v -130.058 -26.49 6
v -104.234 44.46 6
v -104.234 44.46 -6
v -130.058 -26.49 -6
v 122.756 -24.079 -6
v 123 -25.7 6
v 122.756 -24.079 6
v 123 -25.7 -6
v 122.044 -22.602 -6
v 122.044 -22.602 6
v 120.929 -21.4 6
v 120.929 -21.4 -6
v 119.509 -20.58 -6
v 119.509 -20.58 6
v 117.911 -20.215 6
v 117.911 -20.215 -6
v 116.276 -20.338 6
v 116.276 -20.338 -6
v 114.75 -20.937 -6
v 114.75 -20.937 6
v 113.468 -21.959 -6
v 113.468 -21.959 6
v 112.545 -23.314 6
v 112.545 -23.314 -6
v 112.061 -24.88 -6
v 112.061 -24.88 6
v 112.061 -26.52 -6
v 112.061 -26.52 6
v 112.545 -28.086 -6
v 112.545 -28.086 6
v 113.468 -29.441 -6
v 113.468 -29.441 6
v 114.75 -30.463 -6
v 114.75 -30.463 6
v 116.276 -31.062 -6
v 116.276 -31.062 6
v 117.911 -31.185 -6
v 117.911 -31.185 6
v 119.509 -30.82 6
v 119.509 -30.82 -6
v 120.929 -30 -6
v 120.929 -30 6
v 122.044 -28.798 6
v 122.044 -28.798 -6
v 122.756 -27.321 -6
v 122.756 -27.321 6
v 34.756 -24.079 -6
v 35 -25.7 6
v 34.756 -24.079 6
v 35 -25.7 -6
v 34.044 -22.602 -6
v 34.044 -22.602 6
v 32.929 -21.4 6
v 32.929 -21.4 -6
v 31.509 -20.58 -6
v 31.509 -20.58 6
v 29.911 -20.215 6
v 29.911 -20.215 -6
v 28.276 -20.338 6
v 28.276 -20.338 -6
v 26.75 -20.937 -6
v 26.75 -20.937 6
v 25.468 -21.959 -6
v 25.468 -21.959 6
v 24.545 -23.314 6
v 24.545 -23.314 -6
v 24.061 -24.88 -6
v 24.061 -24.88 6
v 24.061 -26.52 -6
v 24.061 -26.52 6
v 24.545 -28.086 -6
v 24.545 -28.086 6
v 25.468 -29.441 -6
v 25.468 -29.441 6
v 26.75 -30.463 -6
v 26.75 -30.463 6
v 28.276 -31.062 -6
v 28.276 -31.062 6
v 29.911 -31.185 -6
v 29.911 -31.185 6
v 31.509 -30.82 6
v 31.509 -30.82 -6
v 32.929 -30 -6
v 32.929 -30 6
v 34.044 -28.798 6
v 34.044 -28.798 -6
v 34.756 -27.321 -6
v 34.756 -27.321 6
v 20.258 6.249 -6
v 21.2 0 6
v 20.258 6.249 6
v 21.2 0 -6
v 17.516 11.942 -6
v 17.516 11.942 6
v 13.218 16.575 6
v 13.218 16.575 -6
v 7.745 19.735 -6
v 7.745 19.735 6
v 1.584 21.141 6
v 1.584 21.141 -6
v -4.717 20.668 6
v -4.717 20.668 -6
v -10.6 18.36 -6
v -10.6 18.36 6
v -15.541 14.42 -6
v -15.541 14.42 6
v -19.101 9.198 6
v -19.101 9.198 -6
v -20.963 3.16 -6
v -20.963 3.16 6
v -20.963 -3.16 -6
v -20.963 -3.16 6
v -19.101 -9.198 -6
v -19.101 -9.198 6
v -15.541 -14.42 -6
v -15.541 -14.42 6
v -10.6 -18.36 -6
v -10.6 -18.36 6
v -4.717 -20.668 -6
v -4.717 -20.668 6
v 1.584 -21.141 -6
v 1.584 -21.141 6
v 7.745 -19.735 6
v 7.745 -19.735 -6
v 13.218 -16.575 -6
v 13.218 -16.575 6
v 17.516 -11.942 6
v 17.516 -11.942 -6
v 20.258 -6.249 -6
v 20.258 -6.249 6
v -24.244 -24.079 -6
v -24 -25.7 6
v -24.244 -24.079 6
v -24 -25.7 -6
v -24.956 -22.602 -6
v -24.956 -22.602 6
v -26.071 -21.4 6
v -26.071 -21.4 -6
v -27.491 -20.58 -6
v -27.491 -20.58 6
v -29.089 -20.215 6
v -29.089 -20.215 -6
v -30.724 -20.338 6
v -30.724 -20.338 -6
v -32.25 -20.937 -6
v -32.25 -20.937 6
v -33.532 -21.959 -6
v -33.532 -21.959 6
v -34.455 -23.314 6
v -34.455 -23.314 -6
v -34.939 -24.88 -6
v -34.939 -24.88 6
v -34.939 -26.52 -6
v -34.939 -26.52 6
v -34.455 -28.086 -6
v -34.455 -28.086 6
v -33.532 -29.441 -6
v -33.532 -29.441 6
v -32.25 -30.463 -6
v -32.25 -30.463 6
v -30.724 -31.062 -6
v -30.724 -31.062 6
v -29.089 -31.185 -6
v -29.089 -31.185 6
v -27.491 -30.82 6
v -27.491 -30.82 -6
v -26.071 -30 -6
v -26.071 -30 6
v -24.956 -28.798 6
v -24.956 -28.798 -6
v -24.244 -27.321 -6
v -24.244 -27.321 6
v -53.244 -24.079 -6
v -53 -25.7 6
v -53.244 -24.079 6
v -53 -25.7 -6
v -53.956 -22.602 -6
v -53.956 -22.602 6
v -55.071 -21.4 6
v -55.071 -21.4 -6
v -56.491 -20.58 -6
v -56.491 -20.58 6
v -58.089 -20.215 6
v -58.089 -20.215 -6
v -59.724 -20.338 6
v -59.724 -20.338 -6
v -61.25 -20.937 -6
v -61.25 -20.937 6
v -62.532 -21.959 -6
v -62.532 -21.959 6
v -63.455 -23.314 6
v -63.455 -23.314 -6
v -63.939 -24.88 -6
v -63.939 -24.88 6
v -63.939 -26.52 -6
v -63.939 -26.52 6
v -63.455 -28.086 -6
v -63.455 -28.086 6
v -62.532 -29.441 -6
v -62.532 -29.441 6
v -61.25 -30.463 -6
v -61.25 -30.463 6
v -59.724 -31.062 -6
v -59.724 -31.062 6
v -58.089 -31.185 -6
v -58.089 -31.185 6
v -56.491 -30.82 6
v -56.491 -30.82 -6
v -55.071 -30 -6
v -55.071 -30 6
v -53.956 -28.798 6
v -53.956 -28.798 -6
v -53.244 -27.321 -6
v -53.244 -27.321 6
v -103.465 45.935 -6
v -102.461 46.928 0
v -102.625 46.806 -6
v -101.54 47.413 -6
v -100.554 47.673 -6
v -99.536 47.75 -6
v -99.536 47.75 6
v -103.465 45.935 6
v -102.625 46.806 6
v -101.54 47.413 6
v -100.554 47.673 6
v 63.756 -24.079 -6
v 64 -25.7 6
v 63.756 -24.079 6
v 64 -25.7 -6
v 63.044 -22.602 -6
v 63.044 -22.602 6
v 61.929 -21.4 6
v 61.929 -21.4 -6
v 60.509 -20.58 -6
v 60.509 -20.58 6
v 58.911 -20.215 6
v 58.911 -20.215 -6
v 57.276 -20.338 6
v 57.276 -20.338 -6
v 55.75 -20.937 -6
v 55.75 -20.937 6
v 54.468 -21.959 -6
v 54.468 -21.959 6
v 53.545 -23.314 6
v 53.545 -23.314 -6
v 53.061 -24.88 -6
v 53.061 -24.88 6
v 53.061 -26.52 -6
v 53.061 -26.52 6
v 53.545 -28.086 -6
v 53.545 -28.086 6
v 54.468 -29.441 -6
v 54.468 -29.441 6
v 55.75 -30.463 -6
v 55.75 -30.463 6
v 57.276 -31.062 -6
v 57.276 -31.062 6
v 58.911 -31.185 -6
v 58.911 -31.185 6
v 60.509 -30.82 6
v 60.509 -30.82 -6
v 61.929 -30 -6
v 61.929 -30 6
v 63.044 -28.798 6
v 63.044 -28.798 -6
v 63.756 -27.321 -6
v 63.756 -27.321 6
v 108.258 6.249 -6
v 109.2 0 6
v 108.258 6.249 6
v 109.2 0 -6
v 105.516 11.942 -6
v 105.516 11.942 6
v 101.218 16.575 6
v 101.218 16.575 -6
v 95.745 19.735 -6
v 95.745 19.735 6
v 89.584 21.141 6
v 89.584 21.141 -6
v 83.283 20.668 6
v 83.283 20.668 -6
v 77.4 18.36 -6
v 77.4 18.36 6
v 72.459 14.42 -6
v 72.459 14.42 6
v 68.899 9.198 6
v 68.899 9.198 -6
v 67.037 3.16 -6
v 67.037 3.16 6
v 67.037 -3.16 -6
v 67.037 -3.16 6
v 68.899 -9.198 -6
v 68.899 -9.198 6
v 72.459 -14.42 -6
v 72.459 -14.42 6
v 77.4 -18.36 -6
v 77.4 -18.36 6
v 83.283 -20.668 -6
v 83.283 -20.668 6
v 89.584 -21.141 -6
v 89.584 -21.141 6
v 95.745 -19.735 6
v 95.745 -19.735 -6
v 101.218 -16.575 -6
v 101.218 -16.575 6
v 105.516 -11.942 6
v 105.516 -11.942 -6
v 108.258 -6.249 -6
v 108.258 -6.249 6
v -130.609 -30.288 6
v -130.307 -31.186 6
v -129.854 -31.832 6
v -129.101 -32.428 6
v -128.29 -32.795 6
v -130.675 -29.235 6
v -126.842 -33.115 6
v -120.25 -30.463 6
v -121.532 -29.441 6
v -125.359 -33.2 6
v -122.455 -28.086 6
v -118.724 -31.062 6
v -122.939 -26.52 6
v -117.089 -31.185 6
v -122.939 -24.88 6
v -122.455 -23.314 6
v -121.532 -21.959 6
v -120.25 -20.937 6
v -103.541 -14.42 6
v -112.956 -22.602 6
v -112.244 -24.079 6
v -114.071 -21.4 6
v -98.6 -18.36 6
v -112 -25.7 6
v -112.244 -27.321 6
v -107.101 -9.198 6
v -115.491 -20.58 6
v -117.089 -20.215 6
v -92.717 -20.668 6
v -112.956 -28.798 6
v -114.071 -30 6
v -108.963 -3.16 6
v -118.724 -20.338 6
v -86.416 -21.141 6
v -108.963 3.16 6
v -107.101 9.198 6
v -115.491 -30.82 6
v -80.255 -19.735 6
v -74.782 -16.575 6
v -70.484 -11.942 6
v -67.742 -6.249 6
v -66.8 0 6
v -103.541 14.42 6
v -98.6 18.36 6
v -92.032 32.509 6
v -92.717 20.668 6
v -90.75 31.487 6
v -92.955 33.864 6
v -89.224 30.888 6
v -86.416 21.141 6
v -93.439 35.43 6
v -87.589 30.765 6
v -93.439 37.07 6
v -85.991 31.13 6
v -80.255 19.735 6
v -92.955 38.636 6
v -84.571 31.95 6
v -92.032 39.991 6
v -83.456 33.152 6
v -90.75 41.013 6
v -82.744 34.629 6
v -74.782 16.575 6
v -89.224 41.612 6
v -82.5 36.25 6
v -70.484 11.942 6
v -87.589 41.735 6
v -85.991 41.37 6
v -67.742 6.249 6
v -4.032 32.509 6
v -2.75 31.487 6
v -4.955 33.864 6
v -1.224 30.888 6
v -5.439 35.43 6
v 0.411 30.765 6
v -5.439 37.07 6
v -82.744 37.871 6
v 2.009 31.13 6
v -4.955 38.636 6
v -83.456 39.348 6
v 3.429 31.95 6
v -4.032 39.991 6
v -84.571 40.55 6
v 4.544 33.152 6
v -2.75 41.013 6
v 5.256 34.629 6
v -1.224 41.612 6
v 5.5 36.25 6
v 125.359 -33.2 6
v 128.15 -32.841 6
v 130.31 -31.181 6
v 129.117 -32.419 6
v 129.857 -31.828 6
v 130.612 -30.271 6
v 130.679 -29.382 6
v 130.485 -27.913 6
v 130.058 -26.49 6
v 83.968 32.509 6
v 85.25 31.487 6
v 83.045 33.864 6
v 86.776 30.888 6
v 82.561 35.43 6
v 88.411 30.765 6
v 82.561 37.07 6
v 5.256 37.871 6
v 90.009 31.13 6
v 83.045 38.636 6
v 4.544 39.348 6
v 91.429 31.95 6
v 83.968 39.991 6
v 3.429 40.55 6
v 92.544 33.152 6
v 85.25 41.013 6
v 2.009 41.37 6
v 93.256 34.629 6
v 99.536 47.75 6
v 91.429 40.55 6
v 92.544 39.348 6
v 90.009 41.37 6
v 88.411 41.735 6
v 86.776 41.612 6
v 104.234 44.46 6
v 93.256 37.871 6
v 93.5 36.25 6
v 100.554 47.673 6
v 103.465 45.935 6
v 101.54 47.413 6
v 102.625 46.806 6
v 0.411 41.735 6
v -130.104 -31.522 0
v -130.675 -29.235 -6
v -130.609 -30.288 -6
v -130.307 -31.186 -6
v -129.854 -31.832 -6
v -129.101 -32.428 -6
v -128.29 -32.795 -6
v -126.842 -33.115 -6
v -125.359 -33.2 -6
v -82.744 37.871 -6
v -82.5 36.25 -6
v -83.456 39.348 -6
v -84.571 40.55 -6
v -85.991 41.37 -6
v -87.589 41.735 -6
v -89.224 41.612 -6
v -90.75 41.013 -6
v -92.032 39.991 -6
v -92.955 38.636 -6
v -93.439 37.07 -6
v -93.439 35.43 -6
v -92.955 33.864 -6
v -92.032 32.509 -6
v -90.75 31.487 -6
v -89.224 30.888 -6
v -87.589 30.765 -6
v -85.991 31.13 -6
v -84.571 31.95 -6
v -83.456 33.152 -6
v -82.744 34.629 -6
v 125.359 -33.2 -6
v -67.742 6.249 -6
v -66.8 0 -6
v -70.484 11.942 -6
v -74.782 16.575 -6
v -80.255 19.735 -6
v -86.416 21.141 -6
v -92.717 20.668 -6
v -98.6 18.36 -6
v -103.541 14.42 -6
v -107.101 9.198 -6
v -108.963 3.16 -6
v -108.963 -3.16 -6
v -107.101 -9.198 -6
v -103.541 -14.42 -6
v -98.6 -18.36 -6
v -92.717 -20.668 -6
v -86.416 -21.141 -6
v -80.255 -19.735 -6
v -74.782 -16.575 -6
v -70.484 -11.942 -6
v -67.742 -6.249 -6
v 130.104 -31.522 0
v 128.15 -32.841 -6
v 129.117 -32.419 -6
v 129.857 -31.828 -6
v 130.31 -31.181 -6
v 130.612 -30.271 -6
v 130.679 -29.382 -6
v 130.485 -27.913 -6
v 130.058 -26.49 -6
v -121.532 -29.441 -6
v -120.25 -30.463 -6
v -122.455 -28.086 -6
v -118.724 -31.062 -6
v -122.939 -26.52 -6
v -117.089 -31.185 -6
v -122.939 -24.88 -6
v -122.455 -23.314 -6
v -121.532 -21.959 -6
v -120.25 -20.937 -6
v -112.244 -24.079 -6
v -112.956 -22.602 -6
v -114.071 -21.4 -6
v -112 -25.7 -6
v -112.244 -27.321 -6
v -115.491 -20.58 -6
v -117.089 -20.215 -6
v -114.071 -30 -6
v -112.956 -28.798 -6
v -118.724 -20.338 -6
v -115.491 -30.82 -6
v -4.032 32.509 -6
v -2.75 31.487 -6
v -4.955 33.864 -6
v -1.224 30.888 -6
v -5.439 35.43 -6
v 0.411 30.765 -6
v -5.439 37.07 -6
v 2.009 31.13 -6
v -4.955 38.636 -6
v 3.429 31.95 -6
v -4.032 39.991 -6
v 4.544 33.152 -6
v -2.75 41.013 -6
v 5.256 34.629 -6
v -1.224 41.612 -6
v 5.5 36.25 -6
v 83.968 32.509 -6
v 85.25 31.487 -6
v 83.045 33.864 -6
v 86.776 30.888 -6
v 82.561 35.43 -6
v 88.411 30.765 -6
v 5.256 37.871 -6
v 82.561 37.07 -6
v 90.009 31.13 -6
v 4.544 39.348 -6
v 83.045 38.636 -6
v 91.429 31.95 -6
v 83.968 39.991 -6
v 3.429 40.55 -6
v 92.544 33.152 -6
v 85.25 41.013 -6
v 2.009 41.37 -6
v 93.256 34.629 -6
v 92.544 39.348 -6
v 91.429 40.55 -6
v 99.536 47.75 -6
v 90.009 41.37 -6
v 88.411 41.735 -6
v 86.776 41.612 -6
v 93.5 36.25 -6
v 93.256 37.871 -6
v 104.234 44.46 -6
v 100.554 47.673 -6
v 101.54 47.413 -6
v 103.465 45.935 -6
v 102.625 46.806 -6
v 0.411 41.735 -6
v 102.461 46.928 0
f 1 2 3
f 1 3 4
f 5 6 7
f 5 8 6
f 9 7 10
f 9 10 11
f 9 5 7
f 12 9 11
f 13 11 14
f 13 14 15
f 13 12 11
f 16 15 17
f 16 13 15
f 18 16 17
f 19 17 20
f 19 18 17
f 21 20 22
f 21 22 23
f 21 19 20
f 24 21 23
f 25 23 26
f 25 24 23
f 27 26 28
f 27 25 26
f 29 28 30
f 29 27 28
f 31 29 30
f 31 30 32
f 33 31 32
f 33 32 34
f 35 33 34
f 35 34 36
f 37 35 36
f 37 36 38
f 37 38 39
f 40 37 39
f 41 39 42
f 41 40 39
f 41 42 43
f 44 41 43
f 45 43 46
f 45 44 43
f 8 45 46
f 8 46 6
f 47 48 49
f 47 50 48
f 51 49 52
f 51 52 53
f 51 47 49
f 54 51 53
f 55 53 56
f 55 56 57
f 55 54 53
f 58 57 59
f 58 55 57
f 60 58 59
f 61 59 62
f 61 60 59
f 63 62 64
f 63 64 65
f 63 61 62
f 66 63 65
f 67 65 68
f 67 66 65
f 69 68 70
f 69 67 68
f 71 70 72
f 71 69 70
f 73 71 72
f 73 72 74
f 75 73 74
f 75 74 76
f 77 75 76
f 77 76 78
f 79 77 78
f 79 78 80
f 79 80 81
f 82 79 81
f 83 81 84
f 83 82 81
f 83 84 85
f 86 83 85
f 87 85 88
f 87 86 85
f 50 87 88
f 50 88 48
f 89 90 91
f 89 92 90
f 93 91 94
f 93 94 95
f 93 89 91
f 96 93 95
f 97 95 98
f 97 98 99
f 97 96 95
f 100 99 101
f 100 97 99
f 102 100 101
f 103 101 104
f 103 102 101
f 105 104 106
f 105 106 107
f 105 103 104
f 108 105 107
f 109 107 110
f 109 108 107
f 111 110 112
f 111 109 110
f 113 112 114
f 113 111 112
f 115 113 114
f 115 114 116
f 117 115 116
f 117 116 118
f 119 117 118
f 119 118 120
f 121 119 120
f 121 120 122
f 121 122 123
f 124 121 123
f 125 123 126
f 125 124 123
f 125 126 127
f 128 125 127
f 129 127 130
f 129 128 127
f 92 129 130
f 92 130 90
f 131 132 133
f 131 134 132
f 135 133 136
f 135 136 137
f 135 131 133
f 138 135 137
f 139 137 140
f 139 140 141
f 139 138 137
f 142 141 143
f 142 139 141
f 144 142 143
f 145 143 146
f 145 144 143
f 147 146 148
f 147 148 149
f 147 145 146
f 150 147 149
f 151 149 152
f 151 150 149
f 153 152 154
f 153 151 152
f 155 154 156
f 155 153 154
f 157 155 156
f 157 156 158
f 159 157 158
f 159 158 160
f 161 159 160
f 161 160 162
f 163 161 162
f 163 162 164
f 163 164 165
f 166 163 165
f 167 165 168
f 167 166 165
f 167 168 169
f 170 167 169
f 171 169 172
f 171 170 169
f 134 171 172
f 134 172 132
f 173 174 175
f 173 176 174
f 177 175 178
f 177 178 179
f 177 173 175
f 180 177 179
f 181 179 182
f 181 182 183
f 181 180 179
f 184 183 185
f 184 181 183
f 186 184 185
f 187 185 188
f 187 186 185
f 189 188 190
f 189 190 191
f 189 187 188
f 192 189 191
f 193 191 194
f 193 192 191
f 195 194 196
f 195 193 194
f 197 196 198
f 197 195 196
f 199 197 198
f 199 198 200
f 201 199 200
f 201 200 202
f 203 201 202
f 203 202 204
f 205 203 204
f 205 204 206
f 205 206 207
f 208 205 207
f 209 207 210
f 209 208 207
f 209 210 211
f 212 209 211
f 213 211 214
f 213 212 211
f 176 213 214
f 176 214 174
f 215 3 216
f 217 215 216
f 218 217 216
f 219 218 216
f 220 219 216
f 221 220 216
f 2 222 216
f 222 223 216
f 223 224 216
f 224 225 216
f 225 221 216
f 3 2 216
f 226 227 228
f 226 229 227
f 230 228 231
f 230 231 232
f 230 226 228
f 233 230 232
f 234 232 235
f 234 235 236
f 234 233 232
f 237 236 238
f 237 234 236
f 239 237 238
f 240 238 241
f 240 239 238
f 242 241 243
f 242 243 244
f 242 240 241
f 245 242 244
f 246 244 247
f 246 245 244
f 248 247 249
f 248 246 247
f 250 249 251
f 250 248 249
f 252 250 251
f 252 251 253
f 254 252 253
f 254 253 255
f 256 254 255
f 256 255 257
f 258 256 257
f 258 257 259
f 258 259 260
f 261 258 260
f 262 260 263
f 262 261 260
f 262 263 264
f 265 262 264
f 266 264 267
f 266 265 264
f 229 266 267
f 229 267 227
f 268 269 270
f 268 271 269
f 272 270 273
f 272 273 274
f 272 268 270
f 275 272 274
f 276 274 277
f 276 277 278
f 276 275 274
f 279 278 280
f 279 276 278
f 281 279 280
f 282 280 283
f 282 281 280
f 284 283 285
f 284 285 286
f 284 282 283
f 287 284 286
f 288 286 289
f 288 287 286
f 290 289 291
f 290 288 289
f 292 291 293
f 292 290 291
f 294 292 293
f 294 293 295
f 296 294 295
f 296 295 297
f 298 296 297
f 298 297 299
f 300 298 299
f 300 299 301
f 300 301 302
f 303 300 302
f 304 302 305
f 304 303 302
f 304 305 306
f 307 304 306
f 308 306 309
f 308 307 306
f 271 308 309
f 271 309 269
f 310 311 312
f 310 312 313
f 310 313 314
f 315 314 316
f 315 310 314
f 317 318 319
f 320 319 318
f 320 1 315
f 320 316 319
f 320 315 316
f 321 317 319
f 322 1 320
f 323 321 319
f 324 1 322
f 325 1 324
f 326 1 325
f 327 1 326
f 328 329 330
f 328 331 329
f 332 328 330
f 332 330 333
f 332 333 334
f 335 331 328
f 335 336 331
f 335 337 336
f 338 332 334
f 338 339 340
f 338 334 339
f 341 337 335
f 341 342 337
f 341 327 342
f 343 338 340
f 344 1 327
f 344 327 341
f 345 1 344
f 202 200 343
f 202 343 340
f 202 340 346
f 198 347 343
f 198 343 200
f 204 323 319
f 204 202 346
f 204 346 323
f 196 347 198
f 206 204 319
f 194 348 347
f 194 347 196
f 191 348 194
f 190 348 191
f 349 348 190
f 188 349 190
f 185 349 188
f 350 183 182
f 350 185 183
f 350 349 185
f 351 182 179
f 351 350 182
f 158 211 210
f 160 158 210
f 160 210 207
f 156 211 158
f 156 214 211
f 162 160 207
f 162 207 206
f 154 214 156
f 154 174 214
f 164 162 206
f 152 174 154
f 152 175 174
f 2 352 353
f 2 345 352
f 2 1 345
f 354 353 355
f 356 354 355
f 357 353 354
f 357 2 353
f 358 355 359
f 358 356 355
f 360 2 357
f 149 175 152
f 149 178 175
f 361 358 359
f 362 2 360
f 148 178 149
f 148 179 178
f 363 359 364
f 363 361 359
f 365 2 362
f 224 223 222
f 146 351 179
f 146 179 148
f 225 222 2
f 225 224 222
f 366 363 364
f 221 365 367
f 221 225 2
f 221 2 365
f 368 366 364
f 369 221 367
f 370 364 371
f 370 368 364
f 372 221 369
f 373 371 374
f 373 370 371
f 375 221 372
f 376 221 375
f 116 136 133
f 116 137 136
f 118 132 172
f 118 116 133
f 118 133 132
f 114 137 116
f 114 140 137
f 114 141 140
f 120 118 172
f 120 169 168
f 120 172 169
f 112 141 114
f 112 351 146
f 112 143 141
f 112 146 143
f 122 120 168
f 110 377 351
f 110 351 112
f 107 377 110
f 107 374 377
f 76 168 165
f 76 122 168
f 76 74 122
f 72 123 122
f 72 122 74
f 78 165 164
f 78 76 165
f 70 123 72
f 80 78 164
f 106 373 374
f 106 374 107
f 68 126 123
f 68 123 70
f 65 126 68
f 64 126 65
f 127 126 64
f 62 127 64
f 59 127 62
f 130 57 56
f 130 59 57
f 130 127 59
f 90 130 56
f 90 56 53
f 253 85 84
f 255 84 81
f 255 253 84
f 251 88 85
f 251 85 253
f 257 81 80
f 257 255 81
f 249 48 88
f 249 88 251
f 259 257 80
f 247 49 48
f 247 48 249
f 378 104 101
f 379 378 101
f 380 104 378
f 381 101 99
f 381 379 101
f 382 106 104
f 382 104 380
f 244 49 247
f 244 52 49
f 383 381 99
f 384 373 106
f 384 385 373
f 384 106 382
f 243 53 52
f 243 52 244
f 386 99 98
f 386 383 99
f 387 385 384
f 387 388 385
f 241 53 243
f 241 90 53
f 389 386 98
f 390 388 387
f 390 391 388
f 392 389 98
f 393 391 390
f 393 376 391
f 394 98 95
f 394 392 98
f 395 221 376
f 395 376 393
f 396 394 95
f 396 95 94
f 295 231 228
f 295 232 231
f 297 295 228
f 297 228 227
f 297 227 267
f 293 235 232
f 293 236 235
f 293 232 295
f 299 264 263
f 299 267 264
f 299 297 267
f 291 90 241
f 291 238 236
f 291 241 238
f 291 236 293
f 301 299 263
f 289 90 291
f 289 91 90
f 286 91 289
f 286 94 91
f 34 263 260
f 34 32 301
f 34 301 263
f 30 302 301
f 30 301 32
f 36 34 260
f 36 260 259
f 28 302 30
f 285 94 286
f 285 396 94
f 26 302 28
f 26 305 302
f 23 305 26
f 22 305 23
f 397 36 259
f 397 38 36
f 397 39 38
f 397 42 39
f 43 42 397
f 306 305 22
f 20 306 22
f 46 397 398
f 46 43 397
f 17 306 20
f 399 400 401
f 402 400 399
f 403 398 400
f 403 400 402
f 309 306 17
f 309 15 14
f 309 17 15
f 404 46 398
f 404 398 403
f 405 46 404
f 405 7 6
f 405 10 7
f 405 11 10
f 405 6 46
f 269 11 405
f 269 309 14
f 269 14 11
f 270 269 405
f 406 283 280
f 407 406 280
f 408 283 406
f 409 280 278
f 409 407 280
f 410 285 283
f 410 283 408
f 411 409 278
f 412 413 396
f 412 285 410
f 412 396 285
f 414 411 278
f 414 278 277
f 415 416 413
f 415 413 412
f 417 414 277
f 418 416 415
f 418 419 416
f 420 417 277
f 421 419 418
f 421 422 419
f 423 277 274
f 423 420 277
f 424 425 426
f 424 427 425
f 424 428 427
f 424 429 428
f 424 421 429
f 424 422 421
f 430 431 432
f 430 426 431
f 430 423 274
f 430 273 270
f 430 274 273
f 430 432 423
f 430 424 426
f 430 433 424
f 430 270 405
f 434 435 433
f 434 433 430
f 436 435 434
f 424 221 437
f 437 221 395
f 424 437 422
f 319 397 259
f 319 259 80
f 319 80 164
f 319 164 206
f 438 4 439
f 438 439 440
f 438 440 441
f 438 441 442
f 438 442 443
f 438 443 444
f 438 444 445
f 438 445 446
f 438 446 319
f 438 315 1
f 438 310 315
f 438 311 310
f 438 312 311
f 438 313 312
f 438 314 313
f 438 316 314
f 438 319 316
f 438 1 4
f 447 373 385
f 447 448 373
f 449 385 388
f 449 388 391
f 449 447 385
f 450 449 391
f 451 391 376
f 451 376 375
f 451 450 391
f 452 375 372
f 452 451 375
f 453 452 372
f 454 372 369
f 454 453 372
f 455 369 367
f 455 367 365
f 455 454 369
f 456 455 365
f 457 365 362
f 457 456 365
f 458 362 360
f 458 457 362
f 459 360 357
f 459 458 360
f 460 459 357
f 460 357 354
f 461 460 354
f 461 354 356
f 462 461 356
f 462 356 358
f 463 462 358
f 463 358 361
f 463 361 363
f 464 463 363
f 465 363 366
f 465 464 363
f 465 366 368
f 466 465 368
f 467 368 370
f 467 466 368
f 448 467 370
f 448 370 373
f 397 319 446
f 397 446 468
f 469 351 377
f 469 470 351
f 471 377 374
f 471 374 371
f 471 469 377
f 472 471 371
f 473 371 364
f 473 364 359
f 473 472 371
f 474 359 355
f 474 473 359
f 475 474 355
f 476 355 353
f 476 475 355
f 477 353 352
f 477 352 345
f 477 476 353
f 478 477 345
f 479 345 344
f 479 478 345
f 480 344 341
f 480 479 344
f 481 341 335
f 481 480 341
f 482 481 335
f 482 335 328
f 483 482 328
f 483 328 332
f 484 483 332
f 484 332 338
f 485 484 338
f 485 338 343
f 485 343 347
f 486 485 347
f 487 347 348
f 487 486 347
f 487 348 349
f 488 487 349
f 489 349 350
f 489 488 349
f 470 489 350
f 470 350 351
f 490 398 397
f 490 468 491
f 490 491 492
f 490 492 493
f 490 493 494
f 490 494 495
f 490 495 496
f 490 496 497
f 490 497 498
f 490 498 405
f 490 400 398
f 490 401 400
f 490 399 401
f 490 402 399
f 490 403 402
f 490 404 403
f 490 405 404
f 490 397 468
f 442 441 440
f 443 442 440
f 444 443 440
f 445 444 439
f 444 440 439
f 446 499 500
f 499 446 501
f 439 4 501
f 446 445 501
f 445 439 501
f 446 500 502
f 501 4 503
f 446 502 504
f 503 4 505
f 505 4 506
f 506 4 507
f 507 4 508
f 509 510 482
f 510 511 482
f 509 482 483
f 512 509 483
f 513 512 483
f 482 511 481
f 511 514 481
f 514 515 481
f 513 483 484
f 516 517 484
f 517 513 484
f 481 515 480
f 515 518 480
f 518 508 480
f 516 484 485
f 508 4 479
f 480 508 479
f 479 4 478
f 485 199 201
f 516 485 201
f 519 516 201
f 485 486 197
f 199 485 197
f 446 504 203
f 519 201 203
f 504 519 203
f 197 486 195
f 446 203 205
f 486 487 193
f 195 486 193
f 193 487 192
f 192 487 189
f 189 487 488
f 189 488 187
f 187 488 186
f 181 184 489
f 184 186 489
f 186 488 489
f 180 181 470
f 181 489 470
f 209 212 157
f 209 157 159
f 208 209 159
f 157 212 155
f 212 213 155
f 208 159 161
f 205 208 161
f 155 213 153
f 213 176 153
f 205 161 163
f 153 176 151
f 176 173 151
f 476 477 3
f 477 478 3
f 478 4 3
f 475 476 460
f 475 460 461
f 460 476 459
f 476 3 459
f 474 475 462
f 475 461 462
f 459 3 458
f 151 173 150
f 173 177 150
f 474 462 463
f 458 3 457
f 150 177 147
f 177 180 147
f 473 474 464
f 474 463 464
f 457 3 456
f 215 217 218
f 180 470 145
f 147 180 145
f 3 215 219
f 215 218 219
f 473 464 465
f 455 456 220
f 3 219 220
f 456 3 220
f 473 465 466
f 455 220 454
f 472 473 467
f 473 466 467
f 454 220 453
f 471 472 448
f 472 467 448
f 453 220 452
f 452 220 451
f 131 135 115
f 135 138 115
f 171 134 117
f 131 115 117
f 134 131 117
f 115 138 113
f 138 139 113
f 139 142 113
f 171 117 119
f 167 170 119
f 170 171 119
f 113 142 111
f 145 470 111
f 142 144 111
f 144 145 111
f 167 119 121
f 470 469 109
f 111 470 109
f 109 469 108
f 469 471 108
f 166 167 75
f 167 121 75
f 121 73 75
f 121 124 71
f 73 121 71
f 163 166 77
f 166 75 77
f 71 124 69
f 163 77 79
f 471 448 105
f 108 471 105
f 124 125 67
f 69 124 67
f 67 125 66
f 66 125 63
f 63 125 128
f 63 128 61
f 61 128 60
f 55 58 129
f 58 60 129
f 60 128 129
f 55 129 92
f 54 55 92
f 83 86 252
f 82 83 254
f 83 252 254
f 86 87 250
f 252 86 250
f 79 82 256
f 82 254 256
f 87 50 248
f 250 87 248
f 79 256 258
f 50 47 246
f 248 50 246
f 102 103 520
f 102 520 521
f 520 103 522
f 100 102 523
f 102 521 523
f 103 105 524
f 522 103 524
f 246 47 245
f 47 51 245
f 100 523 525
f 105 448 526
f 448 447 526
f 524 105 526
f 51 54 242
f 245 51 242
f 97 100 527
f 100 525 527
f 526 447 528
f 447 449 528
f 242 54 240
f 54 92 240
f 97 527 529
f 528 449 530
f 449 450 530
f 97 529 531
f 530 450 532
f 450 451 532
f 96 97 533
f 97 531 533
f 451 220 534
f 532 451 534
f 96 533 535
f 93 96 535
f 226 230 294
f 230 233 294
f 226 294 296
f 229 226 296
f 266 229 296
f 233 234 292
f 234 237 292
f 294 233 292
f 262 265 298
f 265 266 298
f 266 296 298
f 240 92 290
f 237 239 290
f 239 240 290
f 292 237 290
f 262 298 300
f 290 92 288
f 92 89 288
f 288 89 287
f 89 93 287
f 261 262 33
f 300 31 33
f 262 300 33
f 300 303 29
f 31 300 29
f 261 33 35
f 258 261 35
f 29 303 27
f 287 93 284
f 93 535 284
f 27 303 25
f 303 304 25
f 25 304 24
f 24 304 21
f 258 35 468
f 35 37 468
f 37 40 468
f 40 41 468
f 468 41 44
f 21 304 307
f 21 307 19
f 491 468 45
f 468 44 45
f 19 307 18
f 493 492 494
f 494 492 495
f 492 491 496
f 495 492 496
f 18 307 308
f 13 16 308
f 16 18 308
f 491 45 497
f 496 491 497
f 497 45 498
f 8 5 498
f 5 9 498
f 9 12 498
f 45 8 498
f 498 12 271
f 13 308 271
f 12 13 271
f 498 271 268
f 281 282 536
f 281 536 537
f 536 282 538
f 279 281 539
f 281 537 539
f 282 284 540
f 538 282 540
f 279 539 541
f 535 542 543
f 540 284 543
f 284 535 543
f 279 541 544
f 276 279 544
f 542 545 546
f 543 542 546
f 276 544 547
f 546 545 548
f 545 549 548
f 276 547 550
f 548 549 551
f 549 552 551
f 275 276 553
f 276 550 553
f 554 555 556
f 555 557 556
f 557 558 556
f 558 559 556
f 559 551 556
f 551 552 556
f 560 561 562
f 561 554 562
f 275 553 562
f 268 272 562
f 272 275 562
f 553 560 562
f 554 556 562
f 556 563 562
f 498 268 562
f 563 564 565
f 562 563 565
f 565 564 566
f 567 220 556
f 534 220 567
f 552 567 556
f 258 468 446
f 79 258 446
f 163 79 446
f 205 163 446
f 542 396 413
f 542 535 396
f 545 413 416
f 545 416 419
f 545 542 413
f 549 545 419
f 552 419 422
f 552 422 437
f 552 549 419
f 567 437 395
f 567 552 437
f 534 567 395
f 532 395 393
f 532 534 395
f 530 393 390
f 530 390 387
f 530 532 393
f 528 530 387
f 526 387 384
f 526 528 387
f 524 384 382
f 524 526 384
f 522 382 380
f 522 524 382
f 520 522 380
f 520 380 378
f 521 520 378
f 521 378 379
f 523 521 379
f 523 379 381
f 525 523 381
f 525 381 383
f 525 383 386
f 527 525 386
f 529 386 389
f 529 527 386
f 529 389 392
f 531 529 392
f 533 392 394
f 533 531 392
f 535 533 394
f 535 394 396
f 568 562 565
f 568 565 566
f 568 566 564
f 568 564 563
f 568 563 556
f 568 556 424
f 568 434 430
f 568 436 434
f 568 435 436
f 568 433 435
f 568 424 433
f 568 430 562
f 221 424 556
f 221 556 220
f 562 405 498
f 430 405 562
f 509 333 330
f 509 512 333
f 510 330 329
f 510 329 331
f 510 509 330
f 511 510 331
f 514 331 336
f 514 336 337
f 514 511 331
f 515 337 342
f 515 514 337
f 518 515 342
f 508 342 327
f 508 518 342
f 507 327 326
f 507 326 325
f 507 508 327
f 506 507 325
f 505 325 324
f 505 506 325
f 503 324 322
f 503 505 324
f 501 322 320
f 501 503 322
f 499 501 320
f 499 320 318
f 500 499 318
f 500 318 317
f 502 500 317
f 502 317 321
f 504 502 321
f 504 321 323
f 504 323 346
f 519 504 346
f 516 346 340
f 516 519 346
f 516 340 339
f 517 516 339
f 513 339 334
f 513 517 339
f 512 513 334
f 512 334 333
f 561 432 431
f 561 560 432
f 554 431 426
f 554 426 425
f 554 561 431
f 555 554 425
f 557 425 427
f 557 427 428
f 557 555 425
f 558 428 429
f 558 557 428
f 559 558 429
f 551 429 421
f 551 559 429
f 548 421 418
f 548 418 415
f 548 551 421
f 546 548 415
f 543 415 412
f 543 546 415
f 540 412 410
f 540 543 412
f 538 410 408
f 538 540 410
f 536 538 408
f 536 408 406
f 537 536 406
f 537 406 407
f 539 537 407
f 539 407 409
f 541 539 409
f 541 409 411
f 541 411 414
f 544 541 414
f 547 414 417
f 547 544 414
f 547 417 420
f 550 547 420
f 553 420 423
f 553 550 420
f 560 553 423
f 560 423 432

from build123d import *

# Parameters (mm, degrees)
F0_R        = 5.5
F0_R_2      = 21.2
F1_DEPTH    = 6
F2_T1_DEPTH = 47.7037001686
F2_T3_DEPTH = 29.5051884552


# Not quite as in the source:
# - a fillet or chamfer that OpenCascade refuses, or shapes differently, is made with other operations: its cross-section is extruded or revolved along the edge and cut away or added


with BuildPart() as f1:
    # F0 (on Top) → F1 (new body, symmetric)
    with BuildSketch(Plane.XY):
        Polygon((103.0366095362, 47.75), (-103.0366095362, 47.75), (-132.5, -33.2), (0, -33.2), (132.5, -33.2), align=None)
        with Locations((-117.5, -25.7)):
            Circle(F0_R, mode=Mode.SUBTRACT)
        with Locations((-58.5, -25.7)):
            Circle(F0_R, mode=Mode.SUBTRACT)
        with Locations((-29.5, -25.7)):
            Circle(F0_R, mode=Mode.SUBTRACT)
        with Locations((-88, 0)):
            Circle(F0_R_2, mode=Mode.SUBTRACT)
        with Locations((29.5, -25.7)):
            Circle(F0_R, mode=Mode.SUBTRACT)
        with Locations((58.5, -25.7)):
            Circle(F0_R, mode=Mode.SUBTRACT)
        with Locations((117.5, -25.7)):
            Circle(F0_R, mode=Mode.SUBTRACT)
        Circle(F0_R_2, mode=Mode.SUBTRACT)
        with Locations((88, 0)):
            Circle(F0_R_2, mode=Mode.SUBTRACT)
        with Locations((-88, 36.25)):
            Circle(F0_R, mode=Mode.SUBTRACT)
        with Locations((0, 36.25)):
            Circle(F0_R, mode=Mode.SUBTRACT)
        with Locations((88, 36.25)):
            Circle(F0_R, mode=Mode.SUBTRACT)
    extrude(amount=F1_DEPTH, both=True)

    # F2: fillet of radius 5 on 4 edges, made by hand

    # F2_s2 → F2_t1 (cut)
    with BuildSketch(Plane.XY.offset(-23.8518500843)):
        with BuildLine():
            add(Edge.make_bspline(
                [(-125.3592599663, -33.2), (-132.5, -33.2), (-130.0577230702, -26.4898992834)],
                knots=[0, 0, 0, 1, 1, 1], degree=2, weights=[1, 1, 1]))
            Line((-130.0577230702, -26.4898992834), (-132.5, -33.2))
            Line((-132.5, -33.2), (-125.3592599663, -33.2))
        make_face()
        with BuildLine():
            add(Edge.make_bspline(
                [(130.0577230702, -26.4898992834), (132.5, -33.2), (125.3592599663, -33.2)],
                knots=[0, 0, 0, 1, 1, 1], degree=2, weights=[1, 1, 1]))
            Line((125.3592599663, -33.2), (132.5, -33.2))
            Line((132.5, -33.2), (130.0577230702, -26.4898992834))
        make_face()
    extrude(amount=F2_T1_DEPTH, mode=Mode.SUBTRACT)

    # F2_s4 → F2_t3 (cut)
    with BuildSketch(Plane.XY.offset(-14.7525942276)):
        with BuildLine():
            add(Edge.make_bspline(
                [(-99.5355718451, 47.75), (-103.0366095362, 47.75), (-104.234034949, 44.4601007166)],
                knots=[0, 0, 0, 1, 1, 1], degree=2, weights=[1, 1, 1]))
            Line((-104.234034949, 44.4601007166), (-103.0366095362, 47.75))
            Line((-103.0366095362, 47.75), (-99.5355718451, 47.75))
        make_face()
        with BuildLine():
            add(Edge.make_bspline(
                [(99.5355718451, 47.75), (103.0366095362, 47.75), (104.234034949, 44.4601007166)],
                knots=[0, 0, 0, 1, 1, 1], degree=2, weights=[1, 1, 1]))
            Line((104.234034949, 44.4601007166), (103.0366095362, 47.75))
            Line((103.0366095362, 47.75), (99.5355718451, 47.75))
        make_face()
    extrude(amount=F2_T3_DEPTH, mode=Mode.SUBTRACT)


solid = f1.part
